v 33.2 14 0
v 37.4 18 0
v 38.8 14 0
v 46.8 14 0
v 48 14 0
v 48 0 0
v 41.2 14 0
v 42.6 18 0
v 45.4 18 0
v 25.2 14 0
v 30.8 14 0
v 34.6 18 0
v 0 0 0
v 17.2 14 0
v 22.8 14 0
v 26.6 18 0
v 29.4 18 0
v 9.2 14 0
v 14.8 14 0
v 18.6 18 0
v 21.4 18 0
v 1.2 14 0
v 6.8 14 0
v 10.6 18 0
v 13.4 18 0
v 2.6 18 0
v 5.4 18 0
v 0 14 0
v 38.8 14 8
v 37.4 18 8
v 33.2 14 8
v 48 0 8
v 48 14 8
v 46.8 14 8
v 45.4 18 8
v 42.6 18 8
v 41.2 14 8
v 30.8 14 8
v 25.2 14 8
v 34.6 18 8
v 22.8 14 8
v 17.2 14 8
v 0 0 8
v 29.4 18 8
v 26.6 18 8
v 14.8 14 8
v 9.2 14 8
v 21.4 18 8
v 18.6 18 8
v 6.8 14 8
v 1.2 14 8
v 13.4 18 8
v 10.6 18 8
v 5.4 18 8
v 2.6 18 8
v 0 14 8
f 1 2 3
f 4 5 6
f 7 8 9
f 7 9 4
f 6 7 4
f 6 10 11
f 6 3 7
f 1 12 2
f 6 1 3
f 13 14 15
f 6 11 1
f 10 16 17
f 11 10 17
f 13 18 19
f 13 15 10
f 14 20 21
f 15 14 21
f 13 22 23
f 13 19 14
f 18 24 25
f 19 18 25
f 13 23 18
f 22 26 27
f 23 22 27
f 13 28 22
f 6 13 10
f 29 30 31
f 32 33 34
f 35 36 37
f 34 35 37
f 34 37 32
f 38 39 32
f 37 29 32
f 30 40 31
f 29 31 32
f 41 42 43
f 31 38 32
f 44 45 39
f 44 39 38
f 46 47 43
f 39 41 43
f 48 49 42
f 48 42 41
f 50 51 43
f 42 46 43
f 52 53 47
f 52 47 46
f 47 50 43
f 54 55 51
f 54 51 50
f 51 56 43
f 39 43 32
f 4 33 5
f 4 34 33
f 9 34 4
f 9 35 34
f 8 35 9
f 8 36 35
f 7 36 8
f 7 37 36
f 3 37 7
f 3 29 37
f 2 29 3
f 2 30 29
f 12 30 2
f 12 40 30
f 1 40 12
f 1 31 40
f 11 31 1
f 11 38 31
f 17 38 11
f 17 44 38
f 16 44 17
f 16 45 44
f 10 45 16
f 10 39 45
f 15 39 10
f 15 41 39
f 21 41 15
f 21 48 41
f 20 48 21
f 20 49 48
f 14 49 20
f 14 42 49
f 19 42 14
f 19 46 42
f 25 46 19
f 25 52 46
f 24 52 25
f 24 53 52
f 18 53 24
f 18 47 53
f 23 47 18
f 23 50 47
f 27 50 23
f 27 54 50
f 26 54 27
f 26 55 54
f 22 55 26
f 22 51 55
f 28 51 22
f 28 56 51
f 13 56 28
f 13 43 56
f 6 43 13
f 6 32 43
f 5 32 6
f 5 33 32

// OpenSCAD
$fn = 32;

// ----------------------------------------------------------------------
// Gear rack: 6 teeth, pitch 8 mm
// ----------------------------------------------------------------------

// --- parameters (mm) ---
teeth = 6;                // number of teeth
pitch = 8;                // tooth pitch, X
root_w = 5.6;             // tooth width at the root
tip_w = 2.8;              // tooth width at the tip
base_h = 14;              // rack body height, Y
tooth_h = 4;              // tooth height above the body
plate_t = 8;              // rack width, Z (extrusion height)

rack_l = teeth * pitch;  // overall length
total_h = base_h + tooth_h;  // overall height

profile = [[0, 0], [48, 0], [48, 14], [46.8, 14], [45.4, 18], [42.6, 18], [41.2, 14], [38.8, 14], [37.4, 18], [34.6, 18], [33.2, 14], [30.8, 14], [29.4, 18], [26.6, 18], [25.2, 14], [22.8, 14], [21.4, 18], [18.6, 18], [17.2, 14], [14.8, 14], [13.4, 18], [10.6, 18], [9.2, 14], [6.8, 14], [5.4, 18], [2.6, 18], [1.2, 14], [0, 14]];  // primary outline, 28 points, counter clockwise

// --- the one profile operation ---
linear_extrude(height = plate_t) polygon(points = profile);
